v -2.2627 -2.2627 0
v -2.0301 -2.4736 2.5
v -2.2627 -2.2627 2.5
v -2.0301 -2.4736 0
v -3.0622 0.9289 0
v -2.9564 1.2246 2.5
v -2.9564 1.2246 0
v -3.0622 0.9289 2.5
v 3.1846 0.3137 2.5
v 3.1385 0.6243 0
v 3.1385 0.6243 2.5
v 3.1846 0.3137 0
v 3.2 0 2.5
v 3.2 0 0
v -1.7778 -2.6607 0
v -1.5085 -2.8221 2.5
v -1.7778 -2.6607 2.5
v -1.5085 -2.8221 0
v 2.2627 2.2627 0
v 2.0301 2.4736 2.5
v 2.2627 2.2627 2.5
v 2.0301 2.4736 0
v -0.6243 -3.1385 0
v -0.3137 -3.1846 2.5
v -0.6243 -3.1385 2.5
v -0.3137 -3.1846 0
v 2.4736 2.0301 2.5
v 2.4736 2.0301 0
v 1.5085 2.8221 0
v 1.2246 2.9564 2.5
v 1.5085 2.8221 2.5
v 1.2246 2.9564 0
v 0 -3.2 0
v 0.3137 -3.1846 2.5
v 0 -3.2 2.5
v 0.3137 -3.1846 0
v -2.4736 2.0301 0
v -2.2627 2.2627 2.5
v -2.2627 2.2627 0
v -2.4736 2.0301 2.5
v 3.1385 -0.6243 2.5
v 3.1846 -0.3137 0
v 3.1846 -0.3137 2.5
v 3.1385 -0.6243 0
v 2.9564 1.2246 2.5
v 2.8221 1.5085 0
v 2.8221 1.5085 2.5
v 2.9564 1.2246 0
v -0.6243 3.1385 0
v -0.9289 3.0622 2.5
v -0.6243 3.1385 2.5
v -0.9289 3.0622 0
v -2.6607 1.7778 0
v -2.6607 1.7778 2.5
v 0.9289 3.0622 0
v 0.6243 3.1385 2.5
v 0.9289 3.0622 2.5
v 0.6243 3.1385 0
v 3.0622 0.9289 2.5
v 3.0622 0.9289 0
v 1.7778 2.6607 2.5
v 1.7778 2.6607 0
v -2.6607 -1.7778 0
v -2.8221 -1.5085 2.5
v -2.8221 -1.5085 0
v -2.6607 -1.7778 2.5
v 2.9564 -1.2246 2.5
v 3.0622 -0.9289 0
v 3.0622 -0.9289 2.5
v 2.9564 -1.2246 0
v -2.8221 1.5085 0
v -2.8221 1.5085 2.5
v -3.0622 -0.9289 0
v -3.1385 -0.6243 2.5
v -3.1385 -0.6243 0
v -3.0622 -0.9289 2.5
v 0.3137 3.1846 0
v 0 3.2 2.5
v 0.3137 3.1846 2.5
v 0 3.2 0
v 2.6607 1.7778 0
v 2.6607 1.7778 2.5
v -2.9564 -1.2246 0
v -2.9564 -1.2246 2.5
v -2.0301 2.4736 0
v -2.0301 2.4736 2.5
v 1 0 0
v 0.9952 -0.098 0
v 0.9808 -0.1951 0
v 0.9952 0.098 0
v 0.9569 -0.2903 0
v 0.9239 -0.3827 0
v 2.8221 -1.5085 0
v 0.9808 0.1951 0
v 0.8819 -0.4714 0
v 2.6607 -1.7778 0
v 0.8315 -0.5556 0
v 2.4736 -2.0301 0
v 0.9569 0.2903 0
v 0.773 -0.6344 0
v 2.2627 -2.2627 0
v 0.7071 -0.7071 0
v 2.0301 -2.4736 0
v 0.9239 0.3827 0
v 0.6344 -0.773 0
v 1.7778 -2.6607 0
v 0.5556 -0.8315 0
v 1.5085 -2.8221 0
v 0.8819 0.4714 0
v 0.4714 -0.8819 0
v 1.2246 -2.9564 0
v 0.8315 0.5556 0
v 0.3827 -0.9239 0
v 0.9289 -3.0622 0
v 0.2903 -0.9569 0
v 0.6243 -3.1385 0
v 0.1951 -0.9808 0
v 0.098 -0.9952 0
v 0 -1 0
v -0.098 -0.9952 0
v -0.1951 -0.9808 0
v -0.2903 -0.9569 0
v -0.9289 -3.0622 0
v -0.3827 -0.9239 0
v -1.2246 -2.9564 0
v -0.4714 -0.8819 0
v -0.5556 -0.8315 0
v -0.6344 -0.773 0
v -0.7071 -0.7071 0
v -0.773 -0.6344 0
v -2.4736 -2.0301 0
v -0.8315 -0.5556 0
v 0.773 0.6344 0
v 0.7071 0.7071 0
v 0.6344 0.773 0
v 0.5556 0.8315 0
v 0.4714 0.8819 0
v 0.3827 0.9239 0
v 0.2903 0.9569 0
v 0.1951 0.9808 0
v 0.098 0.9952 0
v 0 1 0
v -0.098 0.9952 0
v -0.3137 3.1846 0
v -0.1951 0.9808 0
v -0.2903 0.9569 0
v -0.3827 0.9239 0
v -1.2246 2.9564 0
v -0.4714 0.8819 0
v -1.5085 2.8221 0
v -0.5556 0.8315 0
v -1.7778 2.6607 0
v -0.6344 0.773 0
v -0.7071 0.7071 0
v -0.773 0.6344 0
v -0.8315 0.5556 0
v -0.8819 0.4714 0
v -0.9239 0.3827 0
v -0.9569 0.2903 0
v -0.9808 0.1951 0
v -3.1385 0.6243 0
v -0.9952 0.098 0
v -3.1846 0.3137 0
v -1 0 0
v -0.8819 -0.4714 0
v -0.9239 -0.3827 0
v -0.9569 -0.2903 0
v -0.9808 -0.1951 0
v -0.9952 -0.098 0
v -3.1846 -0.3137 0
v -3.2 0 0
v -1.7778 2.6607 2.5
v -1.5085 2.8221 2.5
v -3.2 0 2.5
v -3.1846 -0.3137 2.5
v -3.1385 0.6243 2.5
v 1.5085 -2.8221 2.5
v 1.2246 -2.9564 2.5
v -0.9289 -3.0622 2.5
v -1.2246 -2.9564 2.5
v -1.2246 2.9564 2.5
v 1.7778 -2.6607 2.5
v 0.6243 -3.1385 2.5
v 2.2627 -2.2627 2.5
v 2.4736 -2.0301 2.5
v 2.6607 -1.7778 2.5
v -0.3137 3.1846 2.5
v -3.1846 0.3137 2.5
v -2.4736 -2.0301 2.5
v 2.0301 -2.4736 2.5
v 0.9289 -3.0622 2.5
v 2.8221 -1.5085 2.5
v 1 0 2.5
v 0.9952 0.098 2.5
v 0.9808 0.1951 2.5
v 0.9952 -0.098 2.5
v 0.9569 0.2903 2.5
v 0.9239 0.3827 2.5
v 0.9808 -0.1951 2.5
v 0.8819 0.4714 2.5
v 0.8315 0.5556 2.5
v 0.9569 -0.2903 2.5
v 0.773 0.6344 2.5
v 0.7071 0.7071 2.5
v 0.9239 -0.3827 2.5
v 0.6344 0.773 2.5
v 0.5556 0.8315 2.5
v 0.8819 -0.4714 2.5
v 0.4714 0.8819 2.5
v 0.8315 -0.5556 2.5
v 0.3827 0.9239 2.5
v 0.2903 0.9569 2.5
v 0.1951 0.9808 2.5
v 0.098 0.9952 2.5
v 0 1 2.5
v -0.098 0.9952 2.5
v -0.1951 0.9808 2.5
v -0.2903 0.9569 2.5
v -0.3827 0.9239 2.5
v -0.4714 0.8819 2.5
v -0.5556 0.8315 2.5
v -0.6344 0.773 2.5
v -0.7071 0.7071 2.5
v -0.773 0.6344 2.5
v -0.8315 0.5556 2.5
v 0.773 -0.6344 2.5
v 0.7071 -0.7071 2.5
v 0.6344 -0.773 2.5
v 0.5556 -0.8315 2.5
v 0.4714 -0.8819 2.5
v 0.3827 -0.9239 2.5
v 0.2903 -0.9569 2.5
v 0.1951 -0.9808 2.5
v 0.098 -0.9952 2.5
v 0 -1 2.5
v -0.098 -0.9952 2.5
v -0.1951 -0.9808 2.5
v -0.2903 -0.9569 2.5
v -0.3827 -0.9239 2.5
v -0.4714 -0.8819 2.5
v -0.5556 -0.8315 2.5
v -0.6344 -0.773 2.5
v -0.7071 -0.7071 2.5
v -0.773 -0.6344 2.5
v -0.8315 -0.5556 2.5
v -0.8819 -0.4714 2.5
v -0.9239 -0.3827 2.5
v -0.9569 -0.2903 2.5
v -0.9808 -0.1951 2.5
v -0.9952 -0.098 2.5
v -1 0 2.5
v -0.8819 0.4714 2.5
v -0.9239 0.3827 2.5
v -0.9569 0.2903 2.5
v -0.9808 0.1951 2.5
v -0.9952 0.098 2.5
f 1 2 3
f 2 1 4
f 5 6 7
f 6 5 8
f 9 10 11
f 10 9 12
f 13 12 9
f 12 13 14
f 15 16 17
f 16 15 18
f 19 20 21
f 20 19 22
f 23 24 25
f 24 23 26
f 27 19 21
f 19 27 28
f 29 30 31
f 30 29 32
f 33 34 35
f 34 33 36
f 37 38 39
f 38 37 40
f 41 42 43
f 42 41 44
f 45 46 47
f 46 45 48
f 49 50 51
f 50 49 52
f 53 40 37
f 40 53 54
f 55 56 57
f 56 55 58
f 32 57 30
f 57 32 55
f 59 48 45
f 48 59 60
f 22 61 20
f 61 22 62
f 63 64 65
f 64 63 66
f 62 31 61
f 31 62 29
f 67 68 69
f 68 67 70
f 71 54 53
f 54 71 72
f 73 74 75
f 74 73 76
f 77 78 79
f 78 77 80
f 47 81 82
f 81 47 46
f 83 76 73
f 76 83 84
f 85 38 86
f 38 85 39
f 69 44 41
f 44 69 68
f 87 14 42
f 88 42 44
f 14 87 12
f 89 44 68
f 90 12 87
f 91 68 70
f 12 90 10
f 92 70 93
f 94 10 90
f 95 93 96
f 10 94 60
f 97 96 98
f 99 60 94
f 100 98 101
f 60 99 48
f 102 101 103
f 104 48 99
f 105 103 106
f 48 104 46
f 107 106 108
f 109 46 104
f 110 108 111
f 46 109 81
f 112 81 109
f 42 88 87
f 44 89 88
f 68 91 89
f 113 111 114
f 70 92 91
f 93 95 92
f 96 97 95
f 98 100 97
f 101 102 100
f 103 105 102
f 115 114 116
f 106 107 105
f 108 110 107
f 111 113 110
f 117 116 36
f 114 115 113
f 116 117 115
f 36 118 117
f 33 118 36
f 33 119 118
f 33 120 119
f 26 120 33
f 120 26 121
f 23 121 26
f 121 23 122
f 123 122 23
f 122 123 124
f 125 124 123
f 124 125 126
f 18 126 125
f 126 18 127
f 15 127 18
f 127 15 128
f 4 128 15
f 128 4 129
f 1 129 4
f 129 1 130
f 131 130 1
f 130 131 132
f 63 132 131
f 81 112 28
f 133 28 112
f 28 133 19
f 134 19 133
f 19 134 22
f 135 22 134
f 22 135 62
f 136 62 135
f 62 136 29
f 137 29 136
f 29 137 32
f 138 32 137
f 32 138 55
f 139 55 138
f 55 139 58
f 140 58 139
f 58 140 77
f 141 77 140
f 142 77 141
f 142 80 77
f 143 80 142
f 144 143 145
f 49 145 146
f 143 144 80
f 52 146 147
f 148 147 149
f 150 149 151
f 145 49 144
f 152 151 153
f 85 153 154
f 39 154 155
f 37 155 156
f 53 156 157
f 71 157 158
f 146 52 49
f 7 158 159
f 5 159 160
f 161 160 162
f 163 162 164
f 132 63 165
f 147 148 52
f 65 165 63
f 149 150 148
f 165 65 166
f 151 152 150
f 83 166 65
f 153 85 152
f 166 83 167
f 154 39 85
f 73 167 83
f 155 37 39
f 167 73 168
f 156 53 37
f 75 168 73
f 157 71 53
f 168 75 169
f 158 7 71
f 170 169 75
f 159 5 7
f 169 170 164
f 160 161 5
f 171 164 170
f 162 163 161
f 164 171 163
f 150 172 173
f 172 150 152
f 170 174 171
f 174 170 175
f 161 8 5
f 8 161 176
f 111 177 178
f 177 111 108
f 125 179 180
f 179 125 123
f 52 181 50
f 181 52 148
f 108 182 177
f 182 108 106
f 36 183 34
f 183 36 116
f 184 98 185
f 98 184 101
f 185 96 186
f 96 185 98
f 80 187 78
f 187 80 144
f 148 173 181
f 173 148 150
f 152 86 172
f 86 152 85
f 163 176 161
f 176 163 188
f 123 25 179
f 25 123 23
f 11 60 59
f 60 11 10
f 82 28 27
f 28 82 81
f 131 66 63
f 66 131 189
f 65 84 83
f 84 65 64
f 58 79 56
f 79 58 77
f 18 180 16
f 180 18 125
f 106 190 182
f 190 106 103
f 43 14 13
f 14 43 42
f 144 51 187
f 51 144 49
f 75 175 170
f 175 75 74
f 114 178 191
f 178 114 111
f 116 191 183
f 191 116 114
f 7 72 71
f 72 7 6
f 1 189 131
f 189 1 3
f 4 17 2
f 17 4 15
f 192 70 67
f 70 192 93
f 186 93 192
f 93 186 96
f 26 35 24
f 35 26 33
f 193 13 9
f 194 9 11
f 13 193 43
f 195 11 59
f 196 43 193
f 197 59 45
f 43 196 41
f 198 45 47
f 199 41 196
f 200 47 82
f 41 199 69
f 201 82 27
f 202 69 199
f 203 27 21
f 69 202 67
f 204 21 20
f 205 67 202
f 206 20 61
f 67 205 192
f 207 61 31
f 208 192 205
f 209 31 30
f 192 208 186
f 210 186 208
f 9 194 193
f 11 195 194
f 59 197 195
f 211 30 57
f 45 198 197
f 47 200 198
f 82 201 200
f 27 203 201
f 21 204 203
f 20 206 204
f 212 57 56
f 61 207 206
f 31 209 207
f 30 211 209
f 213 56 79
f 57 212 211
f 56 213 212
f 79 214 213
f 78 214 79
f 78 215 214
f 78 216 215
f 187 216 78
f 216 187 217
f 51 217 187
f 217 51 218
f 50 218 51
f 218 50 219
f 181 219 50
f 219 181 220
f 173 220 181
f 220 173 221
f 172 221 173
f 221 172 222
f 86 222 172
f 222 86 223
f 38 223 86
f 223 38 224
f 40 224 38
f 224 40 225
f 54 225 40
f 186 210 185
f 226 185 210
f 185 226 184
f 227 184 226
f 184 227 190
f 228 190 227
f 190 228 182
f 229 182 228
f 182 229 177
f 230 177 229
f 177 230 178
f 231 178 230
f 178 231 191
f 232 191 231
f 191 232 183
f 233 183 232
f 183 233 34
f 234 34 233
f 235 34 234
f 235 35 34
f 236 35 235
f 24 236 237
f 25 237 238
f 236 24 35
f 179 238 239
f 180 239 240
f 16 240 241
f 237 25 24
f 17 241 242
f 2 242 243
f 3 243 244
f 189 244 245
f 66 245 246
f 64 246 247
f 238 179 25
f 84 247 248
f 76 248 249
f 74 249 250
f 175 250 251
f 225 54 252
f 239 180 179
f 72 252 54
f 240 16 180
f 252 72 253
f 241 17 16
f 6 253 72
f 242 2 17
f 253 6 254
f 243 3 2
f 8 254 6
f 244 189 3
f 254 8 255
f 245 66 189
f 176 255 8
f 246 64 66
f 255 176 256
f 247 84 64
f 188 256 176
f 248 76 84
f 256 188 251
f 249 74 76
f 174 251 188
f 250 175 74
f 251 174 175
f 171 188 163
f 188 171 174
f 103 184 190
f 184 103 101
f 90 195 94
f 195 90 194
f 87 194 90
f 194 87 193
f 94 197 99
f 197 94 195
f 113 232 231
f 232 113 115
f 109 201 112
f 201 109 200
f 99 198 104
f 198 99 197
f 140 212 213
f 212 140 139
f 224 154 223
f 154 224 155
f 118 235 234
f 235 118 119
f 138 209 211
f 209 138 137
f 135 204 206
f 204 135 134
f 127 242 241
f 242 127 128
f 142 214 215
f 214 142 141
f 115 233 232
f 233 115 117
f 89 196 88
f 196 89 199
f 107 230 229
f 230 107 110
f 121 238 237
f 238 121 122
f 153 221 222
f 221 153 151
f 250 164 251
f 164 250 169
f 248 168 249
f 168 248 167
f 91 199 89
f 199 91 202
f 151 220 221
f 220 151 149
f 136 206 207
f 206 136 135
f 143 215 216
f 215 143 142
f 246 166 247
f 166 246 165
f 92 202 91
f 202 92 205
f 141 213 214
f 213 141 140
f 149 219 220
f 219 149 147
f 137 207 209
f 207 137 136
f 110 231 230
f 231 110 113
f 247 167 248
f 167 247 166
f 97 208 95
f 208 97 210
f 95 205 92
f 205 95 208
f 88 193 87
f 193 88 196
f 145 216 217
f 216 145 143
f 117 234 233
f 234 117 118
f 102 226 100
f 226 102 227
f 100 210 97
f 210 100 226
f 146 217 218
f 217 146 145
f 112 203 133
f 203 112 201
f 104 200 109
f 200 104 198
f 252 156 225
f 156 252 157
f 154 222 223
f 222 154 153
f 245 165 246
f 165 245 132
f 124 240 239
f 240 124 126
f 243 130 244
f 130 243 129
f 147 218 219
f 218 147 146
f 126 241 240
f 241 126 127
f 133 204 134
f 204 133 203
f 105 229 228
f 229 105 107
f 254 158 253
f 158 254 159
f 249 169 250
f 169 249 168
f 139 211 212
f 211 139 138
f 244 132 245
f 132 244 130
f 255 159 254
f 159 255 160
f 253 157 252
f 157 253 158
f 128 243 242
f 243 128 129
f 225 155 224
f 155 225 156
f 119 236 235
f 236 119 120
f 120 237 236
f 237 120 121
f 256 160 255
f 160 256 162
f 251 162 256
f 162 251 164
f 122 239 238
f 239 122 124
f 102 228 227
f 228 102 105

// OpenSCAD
//This is a modification of " Public Domain Parametric Involute Spur Gear (and involute helical gear and involute rack)
// by Leemon Baird, 2011, Leemon@Leemon.com
//http://www.thingiverse.com/thing:5505  "

//Modifications by racatack June 2016:
// v1.0, 6/24/16:
//  -Incorporated 'module InvoluteGear_rack()' from the 11/11/15 comment by quisam2342 in thing:5505 to fix noted problems in rack generation at various tooth sizes
//  -Added a section for an optional 'backboard' that can be used to stiffen an otherwise skinny rack
//  -Added sections for optional Stop Blocks at either or both ends of a rack
//  -Removed extra gears from the example since I only need one pinion. See thing:5505 example section to gain more insight into gear generation.
//v1.1, 6/28/16:
//  -Added sections to optionally create mounting flanges on the bottom/backside of the rack. Flanges can be at either or both ends, or longitudinal.

//TO GENERATE A CUSTOM RACK AND PINION ENTER INPUTS AT LINES 345-377


//////////////////////////////////////////////////////////////////////////////////////////////
// Public Domain Parametric Involute Spur Gear (and involute helical gear and involute rack)
// version 1.1
// by Leemon Baird, 2011, Leemon@Leemon.com
//http://www.thingiverse.com/thing:5505
//
// This file is public domain.  Use it for any purpose, including commercial
// applications.  Attribution would be nice, but is not required.  There is
// no warranty of any kind, including its correctness, usefulness, or safety.
// 
// This is parameterized involute spur (or helical) gear.  It is much simpler and less powerful than
// others on Thingiverse.  But it is public domain.  I implemented it from scratch from the 
// descriptions and equations on Wikipedia and the web, using Mathematica for calculations and testing,
// and I now release it into the public domain.
//
//		http://en.wikipedia.org/wiki/Involute_gear
//		http://en.wikipedia.org/wiki/Gear
//		http://en.wikipedia.org/wiki/List_of_gear_nomenclature
//		http://gtrebaol.free.fr/doc/catia/spur_gear.html
//		http://www.cs.cmu.edu/~rapidproto/mechanisms/chpt7.html
//
// The module gear() gives an involute spur gear, with reasonable defaults for all the parameters.
// Normally, you should just choose the first 4 parameters, and let the rest be default values.
// The module gear() gives a gear in the XY plane, centered on the origin, with one tooth centered on
// the positive Y axis.  The various functions below it take the same parameters, and return various
// measurements for the gear.  The most important is pitch_radius, which tells how far apart to space
// gears that are meshing, and adendum_radius, which gives the size of the region filled by the gear.
// A gear has a "pitch circle", which is an invisible circle that cuts through the middle of each
// tooth (though not the exact center). In order for two gears to mesh, their pitch circles should 
// just touch.  So the distance between their centers should be pitch_radius() for one, plus pitch_radius() 
// for the other, which gives the radii of their pitch circles.
//
// In order for two gears to mesh, they must have the same mm_per_tooth and pressure_angle parameters.  
// mm_per_tooth gives the number of millimeters of arc around the pitch circle covered by one tooth and one
// space between teeth.  The pitch angle controls how flat or bulged the sides of the teeth are.  Common
// values include 14.5 degrees and 20 degrees, and occasionally 25.  Though I've seen 28 recommended for
// plastic gears. Larger numbers bulge out more, giving stronger teeth, so 28 degrees is the default here.
//
// The ratio of number_of_teeth for two meshing gears gives how many times one will make a full 
// revolution when the the other makes one full revolution.  If the two numbers are coprime (i.e. 
// are not both divisible by the same number greater than 1), then every tooth on one gear
// will meet every tooth on the other, for more even wear.  So coprime numbers of teeth are good.
//
// The module rack() gives a rack, which is a bar with teeth.  A rack can mesh with any
// gear that has the same mm_per_tooth and pressure_angle.
//
// Some terminology: 
// The outline of a gear is a smooth circle (the "pitch circle") which has mountains and valleys
// added so it is toothed.  So there is an inner circle (the "root circle") that touches the 
// base of all the teeth, an outer circle that touches the tips of all the teeth,
// and the invisible pitch circle in between them.  There is also a "base circle", which can be smaller than
// all three of the others, which controls the shape of the teeth.  The side of each tooth lies on the path 
// that the end of a string would follow if it were wrapped tightly around the base circle, then slowly unwound.  
// That shape is an "involute", which gives this type of gear its name.
//
//////////////////////////////////////////////////////////////////////////////////////////////

//An involute spur gear, with reasonable defaults for all the parameters.
//Normally, you should just choose the first 4 parameters, and let the rest be default values.
//Meshing gears must match in mm_per_tooth, pressure_angle, and twist,
//and be separated by the sum of their pitch radii, which can be found with pitch_radius().
module gear (
	mm_per_tooth    = 3,    //this is the "circular pitch", the circumference of the pitch circle divided by the number of teeth
	number_of_teeth = 11,   //total number of teeth around the entire perimeter
	thickness       = 6,    //thickness of gear in mm
	hole_diameter   = 3,    //diameter of the hole in the center, in mm
	twist           = 0,    //teeth rotate this many degrees from bottom of gear to top.  360 makes the gear a screw with each thread going around once
	teeth_to_hide   = 0,    //number of teeth to delete to make this only a fraction of a circle
	pressure_angle  = 28,   //Controls how straight or bulged the tooth sides are. In degrees.
	clearance       = 0.0,  //gap between top of a tooth on one gear and bottom of valley on a meshing gear (in millimeters)
	backlash        = 0.0   //gap between two meshing teeth, in the direction along the circumference of the pitch circle
) {
	assign(pi = 3.1415926)
	assign(p  = mm_per_tooth * number_of_teeth / pi / 2)  //radius of pitch circle
	assign(c  = p + mm_per_tooth / pi - clearance)        //radius of outer circle
	assign(b  = p*cos(pressure_angle))                    //radius of base circle
	assign(r  = p-(c-p)-clearance)                        //radius of root circle
	assign(t  = mm_per_tooth/2-backlash/2)                //tooth thickness at pitch circle
	assign(k  = -iang(b, p) - t/2/p/pi*180) {             //angle to where involute meets base circle on each side of tooth
		difference() {
			for (i = [0:number_of_teeth-teeth_to_hide-1] )
				rotate([0,0,i*360/number_of_teeth])
					linear_extrude(height = thickness, center = true, convexity = 10, twist = twist)
						polygon(
							points=[
								[0, -hole_diameter/10],
								polar(r, -181/number_of_teeth),
								polar(r, r<b ? k : -180/number_of_teeth),
								q7(0/5,r,b,c,k, 1),q7(1/5,r,b,c,k, 1),q7(2/5,r,b,c,k, 1),q7(3/5,r,b,c,k, 1),q7(4/5,r,b,c,k, 1),q7(5/5,r,b,c,k, 1),
								q7(5/5,r,b,c,k,-1),q7(4/5,r,b,c,k,-1),q7(3/5,r,b,c,k,-1),q7(2/5,r,b,c,k,-1),q7(1/5,r,b,c,k,-1),q7(0/5,r,b,c,k,-1),
								polar(r, r<b ? -k : 180/number_of_teeth),
								polar(r, 181/number_of_teeth)
							],
 							paths=[[0,1,2,3,4,5,6,7,8,9,10,11,12,13,14,15,16]]
						);
			cylinder(h=2*thickness+1, r=hole_diameter/2, center=true, $fn=20);
		}
	}
};	
//these 4 functions are used by gear
function polar(r,theta)   = r*[sin(theta), cos(theta)];                            //convert polar to cartesian coordinates
function iang(r1,r2)      = sqrt((r2/r1)*(r2/r1) - 1)/3.1415926*180 - acos(r1/r2); //unwind a string this many degrees to go from radius r1 to radius r2
function q7(f,r,b,r2,t,s) = q6(b,s,t,(1-f)*max(b,r)+f*r2);                         //radius a fraction f up the curved side of the tooth 
function q6(b,s,t,d)      = polar(d,s*(iang(b,d)+t));                              //point at radius d on the involute curve

//a rack, which is a straight line with teeth (the same as a segment from a giant gear with a huge number of teeth).
//The "pitch circle" is a line along the X axis.
//module rack (
//	mm_per_tooth    = 3,    //this is the "circular pitch", the circumference of the pitch circle divided by the number //of teeth
//	number_of_teeth = 11,   //total number of teeth along the rack
//	thickness       = 6,    //thickness of rack in mm (affects each tooth)
//	height          = 120,   //height of rack in mm, from tooth top to far side of rack.
//	pressure_angle  = 28,   //Controls how straight or bulged the tooth sides are. In degrees.
//	backlash        = 0.0   //gap between two meshing teeth, in the direction along the circumference of the pitch circle
//) {
//	assign(pi = 3.1415926)
//	assign(a = mm_per_tooth / pi) //addendum
//	assign(t = a*cos(pressure_angle)-1)         //tooth side is tilted so top/bottom corners move this amount
//		for (i = [0:number_of_teeth-1] )
//			translate([i*mm_per_tooth,0,0])
//				linear_extrude(height = thickness, center = true, convexity = 10)
//					polygon(
//						points=[
//							[-mm_per_tooth * 3/4,                 a-height],
//							[-mm_per_tooth * 3/4 - backlash,     -a],
//							[-mm_per_tooth * 1/4 + backlash - t, -a],
//							[-mm_per_tooth * 1/4 + backlash + t,  a],
//							[ mm_per_tooth * 1/4 - backlash - t,  a],
//							[ mm_per_tooth * 1/4 - backlash + t, -a],
//							[ mm_per_tooth * 3/4 + backlash,     -a],
//							[ mm_per_tooth * 3/4,                 a-height],
//						],
//						paths=[[0,1,2,3,4,5,6,7]]
//					);
//};	


  //rac note - This section generates the rack body and teeth. It is from the 11/11/15 comment by quisam2342 in thing:5505 to fix noted problems with rack generation, and replaces the original 'module rack()'
////////////////////////////////////////////////////////////////////////////////////////////////
// The module InvoluteGear_rack() gives a involute gear rack, which is a bar with teeth.
// A rack can mesh with any gear that has the same mm_per_tooth and pressure_angle.
// The "pitch circle" is a line along the X axis.
//
// mm_per_tooth     this is the "circular pitch", the circumference of the pitch circle
//                  divided by the number of teeth
//
// number_of_teeth  total number of teeth along the rack
//
// thickness        thickness of rack in mm
//
// height           height of rack in mm, from tooth top to far side of rack
//
// pressure_angle   controls how straight or bulged the tooth sides are, in degrees
//
// clearance        gap between top of a tooth on one gear and bottom of valley
//                  on a meshing gear, in millimeters
//
// backlash         gap between two meshing teeth, in the direction along the circumference
//                  of the pitch circle
////////////////////////////////////////////////////////////////////////////////////////////////



module InvoluteGear_rack (

   //Default numbers in this section get overridden by numbers in 'example rack and pinion' section, so set your values there.
   
    mm_per_tooth    = 3, //all meshing gears need the same mm_per_tooth 
    number_of_teeth = 11,
    thickness       = 6,
    height          = 4,
    
  //rac - Added variables for backboard, stop blocks and mounting flanges: 
 //set your values in the 'example rack and pinion' section, as defaults given here will be overridden by that section 
    backboard_thickness = 2.0,
    backboard_height = 1.0,
    side_flange_thickness = 0,
    side_flange_height = 0,
    flange_offset = 0, 
    stop_height = backboard_height,
    left_stop_enable = 1, 
    right_stop_enable = 1,
    flange_height = 0,
    left_flange_enable = 1, 
    right_flange_enable = 1,
    
//These defaults are not redefined in the example section:
    pressure_angle  = 28,  //all meshing gears need the same pressure_angle
    clearance       = 0.0,
    backlash        = 0.0

)

{
    // addendum - tooth height above pitch line
    assign(addendum =        module_value(mm_per_tooth) - clearance)

    // dedendum - tooth height below pitch line
    assign(dedendum = 1.25 * module_value(mm_per_tooth)            ) 


    for (i = [0:number_of_teeth-1] )
        translate([(i+0.5)*mm_per_tooth,height-addendum,0])
            linear_extrude(height = thickness, center = true, convexity = 10)  //'height' parameter here is not the same as 'height' parameter of module. Here it effectively is the width or thickness as the rack is extruded from one side-face to the other.
                polygon(
                    points=[
                        [-1/2 * mm_per_tooth,                                              addendum-height],
                        [-1/2 * mm_per_tooth,                                             -dedendum],
                        [-1/4 * mm_per_tooth + backlash - dedendum * tan(pressure_angle), -dedendum],
                        [-1/4 * mm_per_tooth + backlash + addendum * tan(pressure_angle),  addendum],
                        [ 1/4 * mm_per_tooth - backlash - addendum * tan(pressure_angle),  addendum],
                        [ 1/4 * mm_per_tooth - backlash + dedendum * tan(pressure_angle), -dedendum],
                        [ 1/2 * mm_per_tooth,                                             -dedendum],
                        [ 1/2 * mm_per_tooth,                                              addendum-height],
                    ],
                    paths=[[0,1,2,3,4,5,6,7]]
                );

   //rac -added - This section optionally creates a 'stop block' at the left end of the rack
            translate([(-0.11)*mm_per_tooth,0,0.5*(-thickness)])  
            linear_extrude(height = left_stop_enable*thickness, center = false, convexity = 10)
                polygon(
                    points=[
                        [-1/2 * mm_per_tooth,height+stop_height],   //stop_height extends stop block above teeth, change the number to change the extension amount
                        [-1/2 * mm_per_tooth,0],
                        [ 1/2 * mm_per_tooth,0],
                        [ 1/2 * mm_per_tooth,height+stop_height],   //stop_height extends stop block above teeth, change the number to change the extension amount
                    ],
                    paths=[[0,1,2,3]]
                );


    //rac -added - This section optionally creates a 'stop block' at the right end of the rack
            translate([(0.11+number_of_teeth)*mm_per_tooth,0,0.5*(-thickness)])  
            linear_extrude(height = right_stop_enable*thickness, center = false, convexity = 10)
                polygon(
                    points=[
                        [-1/2 * mm_per_tooth,height+stop_height],   //stop_height extends stop block above teeth
                        [-1/2 * mm_per_tooth,0],
                        [ 1/2 * mm_per_tooth,0],
                        [ 1/2 * mm_per_tooth,height+stop_height],   //stop_height extends stop block above teeth
                    ],
                    paths=[[0,1,2,3]]
                );


    //rac -added - This section optionally creates a flange at the left rear of the rack
            translate([(-0.11)*mm_per_tooth,0,0.5*(-thickness)])   
            linear_extrude(height = left_flange_enable*thickness, center = false, convexity = 10)
                polygon(
                    points=[
                        [-1/2 * mm_per_tooth,-flange_height],   //flange_height extends flange beyond rack bottom
                        [-1/2 * mm_per_tooth,0],
                        [ 1/2 * mm_per_tooth,0],
                        [ 1/2 * mm_per_tooth,-flange_height],   //flange_height extends flange beyond rack bottom
                    ],
                    paths=[[0,1,2,3]]
                );



    //rac -added - This section optionally creates a flange at the right rear of the rack
            translate([(0.11+number_of_teeth)*mm_per_tooth,0,0.5*(-thickness)])  
            linear_extrude(height = right_flange_enable*thickness, center = false, convexity = 10)
                polygon(
                    points=[
                        [-1/2 * mm_per_tooth,-flange_height],   //flange_height extends flange beyond rack bottom
                        [-1/2 * mm_per_tooth,0],
                        [ 1/2 * mm_per_tooth,0],
                        [ 1/2 * mm_per_tooth,-flange_height],   //flange_height extends flange beyond rack bottom
                    ],
                    paths=[[0,1,2,3]]
                );



    //rac -added - This section optionally creates a 'Backboard' on one side of the rack. Can be used to add stiffness for a 'thin' rack (i.e. a rack with low height and/or thickness numbers) or if a large negative height is used it can extend under the rack as a mounting flange.
    for (i = [0:number_of_teeth-1] )
        translate([(i+0.5)*mm_per_tooth,0,0.5*(-thickness+backboard_thickness)])    
        //0.5*(-thickness+backboard_thickness) starts the backboard at one side of the rack and extrudes it inward
            linear_extrude(height = backboard_thickness, center = true, convexity = 10)
                polygon(
                    points=[
                        [-1/2 * mm_per_tooth,height+backboard_height],   //backboard_height extends backboard above teeth
                        [-1/2 * mm_per_tooth,0],

                        [ 1/2 * mm_per_tooth,0],
                        [ 1/2 * mm_per_tooth,height+backboard_height],   //backboard_height extends backboard above teeth
                    ],
                    paths=[[0,1,2,3]]
                );


    //rac -added - This section optionally creates a Rear Side-Flange on along one side of the rack. Can be used to add stiffness for a 'thin' rack (i.e. a rack with low height and/or thickness numbers) or it can be used as a mounting flange.
    for (i = [0:number_of_teeth-1] )
        translate([(i+0.5)*mm_per_tooth,0,0.5*(-thickness+side_flange_thickness)+flange_offset])    
        //0.5*(-side_flange_thickness) starts the backboard at one side of the rack and extrudes it inward. flange_offset moves the flange toward the other side of the rack
            linear_extrude(height = side_flange_thickness, center = true, convexity = 10)
                polygon(
                    points=[
                        [-1/2 * mm_per_tooth,-side_flange_height],   //side_flange_height extends side_flange beyond rack bottom
                        [-1/2 * mm_per_tooth,0],

                        [ 1/2 * mm_per_tooth,0],
                        [ 1/2 * mm_per_tooth,-side_flange_height],   //side_flange_height extends backboard beyond rack bottom
                    ],
                    paths=[[0,1,2,3]]
                );

}


//These 5 functions let the user find the derived dimensions of the gear.
//A gear fits within a circle of radius outer_radius, and two gears should have
//their centers separated by the sum of their pictch_radius.
function circular_pitch  (mm_per_tooth=3) = mm_per_tooth;                     //tooth density expressed as "circular pitch" in millimeters
function diametral_pitch (mm_per_tooth=3) = 3.1415926 / mm_per_tooth;         //tooth density expressed as "diametral pitch" in teeth per millimeter
function module_value    (mm_per_tooth=3) = mm_per_tooth / 3.1415926;                //tooth density expressed as "module" or "modulus" in millimeters
function pitch_radius    (mm_per_tooth=3,number_of_teeth=11) = mm_per_tooth * number_of_teeth / 3.1415926 / 2;
function outer_radius    (mm_per_tooth=3,number_of_teeth=11,clearance=0.1)    //The gear fits entirely within a cylinder of this radius.
	= mm_per_tooth*(1+number_of_teeth/2)/3.1415926  - clearance;              





//////////////////////////////////////////////////////////////////////////////////////////////

//GENERATE A RACK AND PINION 
//ENTER YOUR VALUES HERE: (not in defaults of InvoluteGear_rack() or gear() modules)

//The variable names can be confusing - experiment! Change something then click the dotted cube with Fast-Forward arrows.

//example rack and pinion:
//all distances in mm
n1 = 8; //red gear number of teeth. Set to zero if you don't want to print a pinion.
n5 = 24;  //gray rack number of teeth.  Set to 1 if you don't want to print a rack- that's as small as it gets (you'll get 2 teeth if you set it to zero... I haven't tried to determine why that happens)
mm_per_tooth = 2;
thickness    = 9;  // depth of the rack from side-to-side, including backboard if any. The pinion will be this depth minus the backboard_thickness
hole         = 1.6;   //hole diameter in pinion gear
height       = 6;  // distance from bottom of the rack to the tips of the teeth



d1 =pitch_radius(mm_per_tooth,n1);

union() {

//Generation of pinion gear:
translate([0, 0, height/2]) color([1.00,0.75,0.75]) gear(mm_per_tooth,n1,height,hole, pressure_angle=33
);

difference() {
    cylinder(h=2.5, r=3.2, $fn=64);
    translate([0, 0, -1]) cylinder(h=3.6, d=2, $fn=64);
}
}


//end of example rack and pinion 
//////////////////////////////////////////////////////////////////////////////////////////////////
